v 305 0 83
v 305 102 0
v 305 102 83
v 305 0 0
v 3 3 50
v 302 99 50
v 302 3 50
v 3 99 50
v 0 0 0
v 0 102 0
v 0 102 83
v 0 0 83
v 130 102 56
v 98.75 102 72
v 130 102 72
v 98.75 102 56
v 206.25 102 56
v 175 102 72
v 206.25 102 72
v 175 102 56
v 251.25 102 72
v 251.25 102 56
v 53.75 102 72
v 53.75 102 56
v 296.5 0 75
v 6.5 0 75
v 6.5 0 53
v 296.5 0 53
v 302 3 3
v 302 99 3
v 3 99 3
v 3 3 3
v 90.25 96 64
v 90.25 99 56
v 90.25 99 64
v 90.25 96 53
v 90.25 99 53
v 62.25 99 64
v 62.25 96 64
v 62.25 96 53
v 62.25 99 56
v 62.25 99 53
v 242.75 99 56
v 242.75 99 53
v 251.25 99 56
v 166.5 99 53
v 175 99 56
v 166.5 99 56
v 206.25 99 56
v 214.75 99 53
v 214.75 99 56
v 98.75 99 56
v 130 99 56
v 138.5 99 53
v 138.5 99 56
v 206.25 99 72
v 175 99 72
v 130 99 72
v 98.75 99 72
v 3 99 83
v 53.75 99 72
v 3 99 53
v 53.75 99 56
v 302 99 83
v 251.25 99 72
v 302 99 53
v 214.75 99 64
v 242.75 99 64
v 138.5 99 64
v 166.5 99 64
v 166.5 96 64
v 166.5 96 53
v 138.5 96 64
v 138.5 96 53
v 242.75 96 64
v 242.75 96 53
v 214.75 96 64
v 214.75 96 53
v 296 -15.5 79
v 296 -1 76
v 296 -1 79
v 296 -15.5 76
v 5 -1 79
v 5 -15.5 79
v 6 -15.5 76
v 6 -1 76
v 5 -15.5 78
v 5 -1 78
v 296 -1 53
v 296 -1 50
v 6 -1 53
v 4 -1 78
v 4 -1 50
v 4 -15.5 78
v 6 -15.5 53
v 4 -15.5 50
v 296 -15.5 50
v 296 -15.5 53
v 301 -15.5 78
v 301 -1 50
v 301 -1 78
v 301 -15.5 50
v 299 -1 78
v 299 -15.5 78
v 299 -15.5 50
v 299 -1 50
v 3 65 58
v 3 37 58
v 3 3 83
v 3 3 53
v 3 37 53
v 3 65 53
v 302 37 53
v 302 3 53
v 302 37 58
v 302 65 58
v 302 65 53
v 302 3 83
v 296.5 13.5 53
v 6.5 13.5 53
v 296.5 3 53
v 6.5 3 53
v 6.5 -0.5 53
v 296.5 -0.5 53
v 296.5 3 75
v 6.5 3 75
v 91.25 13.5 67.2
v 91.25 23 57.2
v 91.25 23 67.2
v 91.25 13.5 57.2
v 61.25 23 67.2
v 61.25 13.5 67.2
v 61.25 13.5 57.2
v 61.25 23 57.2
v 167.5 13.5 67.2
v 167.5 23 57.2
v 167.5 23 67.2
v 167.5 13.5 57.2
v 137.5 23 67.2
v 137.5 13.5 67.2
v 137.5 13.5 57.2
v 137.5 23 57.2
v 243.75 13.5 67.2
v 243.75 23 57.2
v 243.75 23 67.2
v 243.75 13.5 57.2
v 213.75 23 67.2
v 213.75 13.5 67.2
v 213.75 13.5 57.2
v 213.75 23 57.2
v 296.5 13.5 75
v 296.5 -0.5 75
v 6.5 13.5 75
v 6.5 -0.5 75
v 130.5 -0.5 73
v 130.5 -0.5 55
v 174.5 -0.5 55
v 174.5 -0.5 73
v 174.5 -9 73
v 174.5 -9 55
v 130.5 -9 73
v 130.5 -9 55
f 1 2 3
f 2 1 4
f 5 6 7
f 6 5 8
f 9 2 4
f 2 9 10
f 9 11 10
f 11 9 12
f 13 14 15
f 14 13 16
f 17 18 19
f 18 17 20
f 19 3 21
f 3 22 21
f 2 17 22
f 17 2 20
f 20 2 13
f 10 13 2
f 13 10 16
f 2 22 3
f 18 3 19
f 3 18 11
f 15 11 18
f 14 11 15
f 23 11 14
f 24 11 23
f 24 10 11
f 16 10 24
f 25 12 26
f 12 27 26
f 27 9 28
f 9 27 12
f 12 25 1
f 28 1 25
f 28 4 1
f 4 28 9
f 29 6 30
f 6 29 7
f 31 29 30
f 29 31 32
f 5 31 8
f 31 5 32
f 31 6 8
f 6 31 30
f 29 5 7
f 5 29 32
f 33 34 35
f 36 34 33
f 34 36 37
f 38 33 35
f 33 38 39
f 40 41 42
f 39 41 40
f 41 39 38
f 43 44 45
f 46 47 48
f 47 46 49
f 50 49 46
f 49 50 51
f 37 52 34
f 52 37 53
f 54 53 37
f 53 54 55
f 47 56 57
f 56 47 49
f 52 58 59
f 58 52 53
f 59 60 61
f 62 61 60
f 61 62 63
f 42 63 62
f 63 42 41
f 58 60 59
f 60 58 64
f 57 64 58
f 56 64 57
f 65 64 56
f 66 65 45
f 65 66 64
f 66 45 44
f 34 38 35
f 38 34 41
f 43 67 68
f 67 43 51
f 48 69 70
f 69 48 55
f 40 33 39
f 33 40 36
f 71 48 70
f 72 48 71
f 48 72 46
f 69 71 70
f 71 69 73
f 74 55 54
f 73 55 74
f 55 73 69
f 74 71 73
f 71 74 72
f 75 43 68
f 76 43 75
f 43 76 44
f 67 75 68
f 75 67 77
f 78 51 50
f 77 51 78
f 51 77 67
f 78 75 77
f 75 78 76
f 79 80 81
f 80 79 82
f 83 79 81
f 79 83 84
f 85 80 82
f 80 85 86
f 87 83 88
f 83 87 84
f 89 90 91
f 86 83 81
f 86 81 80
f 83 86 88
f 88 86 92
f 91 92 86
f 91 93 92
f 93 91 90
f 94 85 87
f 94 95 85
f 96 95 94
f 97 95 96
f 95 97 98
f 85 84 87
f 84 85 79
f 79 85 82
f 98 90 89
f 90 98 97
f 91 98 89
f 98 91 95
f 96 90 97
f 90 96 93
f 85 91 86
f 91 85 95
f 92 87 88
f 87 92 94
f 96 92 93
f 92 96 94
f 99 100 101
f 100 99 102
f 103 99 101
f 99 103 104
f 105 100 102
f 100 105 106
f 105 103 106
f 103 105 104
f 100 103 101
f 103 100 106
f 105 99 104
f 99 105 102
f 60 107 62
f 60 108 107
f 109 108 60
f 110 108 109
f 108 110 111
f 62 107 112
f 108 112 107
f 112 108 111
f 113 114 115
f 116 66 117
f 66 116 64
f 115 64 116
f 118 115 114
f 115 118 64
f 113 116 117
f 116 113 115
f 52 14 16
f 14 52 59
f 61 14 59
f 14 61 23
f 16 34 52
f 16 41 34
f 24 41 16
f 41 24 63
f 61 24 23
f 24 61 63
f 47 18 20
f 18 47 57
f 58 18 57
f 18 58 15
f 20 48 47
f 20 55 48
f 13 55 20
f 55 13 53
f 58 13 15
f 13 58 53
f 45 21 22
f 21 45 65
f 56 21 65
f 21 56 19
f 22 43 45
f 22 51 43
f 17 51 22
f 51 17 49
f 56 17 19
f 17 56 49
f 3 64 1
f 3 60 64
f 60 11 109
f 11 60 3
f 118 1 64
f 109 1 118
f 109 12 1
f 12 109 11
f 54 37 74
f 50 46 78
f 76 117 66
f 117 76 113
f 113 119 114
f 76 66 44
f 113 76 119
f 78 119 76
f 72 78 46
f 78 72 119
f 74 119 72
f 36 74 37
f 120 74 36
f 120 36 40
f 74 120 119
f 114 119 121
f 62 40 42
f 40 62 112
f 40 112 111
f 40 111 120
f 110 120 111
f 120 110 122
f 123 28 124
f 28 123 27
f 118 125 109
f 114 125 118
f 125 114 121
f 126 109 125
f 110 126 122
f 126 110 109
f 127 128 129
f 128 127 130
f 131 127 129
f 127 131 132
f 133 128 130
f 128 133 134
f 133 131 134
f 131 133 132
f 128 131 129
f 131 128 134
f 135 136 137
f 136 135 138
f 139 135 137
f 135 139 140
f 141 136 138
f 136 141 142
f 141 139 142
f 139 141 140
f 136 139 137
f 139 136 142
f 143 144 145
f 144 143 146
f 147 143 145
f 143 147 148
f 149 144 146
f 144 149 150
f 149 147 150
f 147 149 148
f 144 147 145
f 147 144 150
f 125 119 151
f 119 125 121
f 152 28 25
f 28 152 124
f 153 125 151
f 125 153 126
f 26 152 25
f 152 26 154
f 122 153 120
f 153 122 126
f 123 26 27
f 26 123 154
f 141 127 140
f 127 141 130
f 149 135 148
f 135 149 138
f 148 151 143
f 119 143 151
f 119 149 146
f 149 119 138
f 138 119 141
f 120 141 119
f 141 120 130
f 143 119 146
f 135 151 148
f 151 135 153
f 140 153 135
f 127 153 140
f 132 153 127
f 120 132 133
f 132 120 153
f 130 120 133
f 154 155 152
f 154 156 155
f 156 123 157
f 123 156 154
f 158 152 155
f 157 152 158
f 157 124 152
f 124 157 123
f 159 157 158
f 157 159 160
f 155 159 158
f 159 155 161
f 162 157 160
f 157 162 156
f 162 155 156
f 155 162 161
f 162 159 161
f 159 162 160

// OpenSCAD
// 01_single_front_bar.scad
// Variant 1: Single push-in bar (+Y) with 3 tongues entering front windows.
// Housing clips onto front face of new tray (y<0 exterior side).
// UNLOCKED: bar retracted (tongues at y<0, clear of drop path).
// LOCKED: bar pushed in +Y, 3 tongues enter front windows (y=0..3 gap at z=56..72).
// Back side: 3 fixed posts inside footprint capture back windows on drop.
// End rim-lips at x=0, x=305 grip top tray corners.
//
// lock=0 → unlocked (top tray can lift straight up)
// lock=1 → locked (tongues in windows)

lock = 1;
$fn = 48;

// ── Tray geometry ──────────────────────────────────────────────────────────
TW = 305; TD = 102; TH_NEW = 50; TH_TOP = 33; WALL = 3;
TOP_BASE_Z = TH_NEW;  // z=50

// Windows in front (y=0..3) and back (y=99..102) walls of TOP tray
WIN_W = 45; WIN_H = 16; WIN_Z_CTR = 64;
WIN_Z_BOT = WIN_Z_CTR - WIN_H/2;  // 56
WIN_Z_TOP = WIN_Z_CTR + WIN_H/2;  // 72
WIN_XS = [TW*1/4, TW*2/4, TW*3/4];  // 76.25, 152.5, 228.75

// ── Mechanism parameters ───────────────────────────────────────────────────
// Tongue cross-section (fits inside window): 30W(X) × 10H(Z) inside 45W × 16H window
TONGUE_W = 30; TONGUE_H = 10;
CL = 1.2;  // clearance around tongue in window

// Bar body: rides in channel on front face of new tray (exterior, y<0)
// Housing is attached to new tray front face
BAR_W = TW - 2*WALL - 6;  // full span minus end clearance
BAR_H = WIN_H + 6;         // Z span covers window height with margin
BAR_Z0 = WIN_Z_BOT - 3;   // bar bottom z (3mm below window bottom)
BAR_D = 14;                // Y depth of bar body (exterior of new tray)

// Travel: bar pushed +Y from retracted to locked
// Tongue starts at y=-TONGUE_REACH, locked at y=0..TONGUE_ENGAGE
TONGUE_REACH = 8;    // how deep tongue sits outside wall before locking
TONGUE_ENGAGE = 6;   // how far tongue penetrates into window (y=0..ENGAGE)
TRAVEL = TONGUE_REACH + TONGUE_ENGAGE;  // total bar travel = 14mm

// Channel slot cut into new tray front wall to let tongues pass through at z=56..72
// (tongues move in Y through the front wall thickness as bar pushes in)
SLOT_H = TONGUE_H;  // Z height of slot in new tray front wall
SLOT_Z0 = WIN_Z_BOT + CL;  // slot z start

// Housing channel for bar rail (cut into new tray front wall exterior area)
// Bar body at y = -BAR_D..-0.5 (offset from y=0 face)
HSG_W = BAR_W + 2;
HSG_H = BAR_H + 2;
HSG_Z0 = BAR_Z0 - 1;

// Detent bumps for locked and unlocked positions
DET_R = 2.0;

// Rear capture posts (passive, within footprint)
RPOST_W = 28; RPOST_H = 14; RPOST_D = WALL;

// End rim-lip hooks on short sides
LIP_T = WALL; LIP_W = 28; LIP_H = 8;

// Colors
COL_NEW  = "#1565C0";
COL_TOP  = "#90A4AE";
COL_BOLT = "#C62828";

// ── Modules ────────────────────────────────────────────────────────────────

module new_tray() {
    color(COL_NEW) union() {
        difference() {
            cube([TW, TD, TH_NEW]);
            // hollow interior
            translate([WALL, WALL, WALL])
                cube([TW-2*WALL, TD-2*WALL, TH_NEW-WALL+0.1]);
            // tongue pass-through slots in front wall (tongues enter here when locking)
            for (wx = WIN_XS)
                translate([wx - TONGUE_W/2 - CL, -0.1, SLOT_Z0])
                    cube([TONGUE_W + 2*CL, WALL + 0.2, SLOT_H]);
            // housing rail channel on outside of front face: cut a groove for bar to ride
            // (bar housing is bolted on front face – groove is captive track)
            translate([WALL+3, -BAR_D - 1, BAR_Z0 - 1])
                cube([BAR_W - 2, BAR_D + 0.5, BAR_H + 2]);
            // detent sockets in front wall face for locked / unlocked
            translate([TW/2, -BAR_D/2, BAR_Z0 + BAR_H/2 + 3])
                rotate([0, 0, 0]) sphere(r=DET_R);
            translate([TW/2, -BAR_D/2 - TRAVEL, BAR_Z0 + BAR_H/2 + 3])
                sphere(r=DET_R);
        }

        // Housing frame plates (front flange keeping bar captive)
        // Top flange
        translate([WALL+2, -BAR_D - 1.5, BAR_Z0 + BAR_H + 1])
            cube([BAR_W - 2, BAR_D + 0.5, WALL]);
        // Bottom flange
        translate([WALL+2, -BAR_D - 1.5, BAR_Z0 - WALL])
            cube([BAR_W - 2, BAR_D + 0.5, WALL]);

        // End stop tabs (prevent bar sliding out of housing)
        translate([WALL + 1, -BAR_D - 1.5, BAR_Z0 - WALL])
            cube([2, BAR_D + 0.5, BAR_H + 2*WALL]);
        translate([TW - WALL - 3, -BAR_D - 1.5, BAR_Z0 - WALL])
            cube([2, BAR_D + 0.5, BAR_H + 2*WALL]);

        // Rear capture posts (within footprint, flush with back)
        for (wx = WIN_XS)
            translate([wx - RPOST_W/2, TD - WALL - RPOST_D, TOP_BASE_Z])
                cube([RPOST_W, RPOST_D, RPOST_H]);

        // End rim-lip hooks on short sides
        translate([0, TD/2 - LIP_W/2, TOP_BASE_Z])
            cube([LIP_T, LIP_W, LIP_H]);
        translate([TW - LIP_T, TD/2 - LIP_W/2, TOP_BASE_Z])
            cube([LIP_T, LIP_W, LIP_H]);
    }
}

module top_tray() {
    color(COL_TOP) translate([0, 0, TOP_BASE_Z]) difference() {
        cube([TW, TD, TH_TOP]);
        translate([WALL, WALL, WALL]) cube([TW-2*WALL, TD-2*WALL, TH_TOP]);
        // front windows
        for (wx = WIN_XS)
            translate([wx-WIN_W/2, -0.1, WIN_Z_BOT-TOP_BASE_Z])
                cube([WIN_W, WALL+0.2, WIN_H]);
        // back windows
        for (wx = WIN_XS)
            translate([wx-WIN_W/2, TD-WALL-0.1, WIN_Z_BOT-TOP_BASE_Z])
                cube([WIN_W, WALL+0.2, WIN_H]);
    }
}

module push_bar(off_y) {
    // off_y=0 → retracted (unlocked); off_y=TRAVEL → locked
    // Bar body in the exterior housing, tongues enter windows as bar moves +Y
    color(COL_BOLT)
    translate([0, off_y, 0]) {
        // main bar body (exterior of new tray, y<0)
        translate([WALL+3 + 0.5, -BAR_D - 0.5, BAR_Z0])
            cube([BAR_W - 3, BAR_D, BAR_H]);
        // 3 tongues at window height, pointing in +Y direction
        for (wx = WIN_XS) {
            translate([wx - TONGUE_W/2, -TONGUE_REACH, WIN_Z_BOT + CL])
                cube([TONGUE_W, TONGUE_REACH + TONGUE_ENGAGE + WALL, TONGUE_H]);
        }
        // pull/push grip tab at center (extends forward in -Y for finger access)
        translate([TW/2 - 22, -BAR_D - 9, BAR_Z0 + 2])
            cube([44, 9, BAR_H - 4]);
        // detent nub on bar face (mates with socket in housing)
        translate([TW/2, -BAR_D/2 - 0.5, BAR_Z0 + BAR_H/2 + 3])
            sphere(r=DET_R * 0.82);
    }
}

// ── Assembly ───────────────────────────────────────────────────────────────
bar_y = (lock == 1) ? TRAVEL : 0;

new_tray();
top_tray();
push_bar(bar_y);
